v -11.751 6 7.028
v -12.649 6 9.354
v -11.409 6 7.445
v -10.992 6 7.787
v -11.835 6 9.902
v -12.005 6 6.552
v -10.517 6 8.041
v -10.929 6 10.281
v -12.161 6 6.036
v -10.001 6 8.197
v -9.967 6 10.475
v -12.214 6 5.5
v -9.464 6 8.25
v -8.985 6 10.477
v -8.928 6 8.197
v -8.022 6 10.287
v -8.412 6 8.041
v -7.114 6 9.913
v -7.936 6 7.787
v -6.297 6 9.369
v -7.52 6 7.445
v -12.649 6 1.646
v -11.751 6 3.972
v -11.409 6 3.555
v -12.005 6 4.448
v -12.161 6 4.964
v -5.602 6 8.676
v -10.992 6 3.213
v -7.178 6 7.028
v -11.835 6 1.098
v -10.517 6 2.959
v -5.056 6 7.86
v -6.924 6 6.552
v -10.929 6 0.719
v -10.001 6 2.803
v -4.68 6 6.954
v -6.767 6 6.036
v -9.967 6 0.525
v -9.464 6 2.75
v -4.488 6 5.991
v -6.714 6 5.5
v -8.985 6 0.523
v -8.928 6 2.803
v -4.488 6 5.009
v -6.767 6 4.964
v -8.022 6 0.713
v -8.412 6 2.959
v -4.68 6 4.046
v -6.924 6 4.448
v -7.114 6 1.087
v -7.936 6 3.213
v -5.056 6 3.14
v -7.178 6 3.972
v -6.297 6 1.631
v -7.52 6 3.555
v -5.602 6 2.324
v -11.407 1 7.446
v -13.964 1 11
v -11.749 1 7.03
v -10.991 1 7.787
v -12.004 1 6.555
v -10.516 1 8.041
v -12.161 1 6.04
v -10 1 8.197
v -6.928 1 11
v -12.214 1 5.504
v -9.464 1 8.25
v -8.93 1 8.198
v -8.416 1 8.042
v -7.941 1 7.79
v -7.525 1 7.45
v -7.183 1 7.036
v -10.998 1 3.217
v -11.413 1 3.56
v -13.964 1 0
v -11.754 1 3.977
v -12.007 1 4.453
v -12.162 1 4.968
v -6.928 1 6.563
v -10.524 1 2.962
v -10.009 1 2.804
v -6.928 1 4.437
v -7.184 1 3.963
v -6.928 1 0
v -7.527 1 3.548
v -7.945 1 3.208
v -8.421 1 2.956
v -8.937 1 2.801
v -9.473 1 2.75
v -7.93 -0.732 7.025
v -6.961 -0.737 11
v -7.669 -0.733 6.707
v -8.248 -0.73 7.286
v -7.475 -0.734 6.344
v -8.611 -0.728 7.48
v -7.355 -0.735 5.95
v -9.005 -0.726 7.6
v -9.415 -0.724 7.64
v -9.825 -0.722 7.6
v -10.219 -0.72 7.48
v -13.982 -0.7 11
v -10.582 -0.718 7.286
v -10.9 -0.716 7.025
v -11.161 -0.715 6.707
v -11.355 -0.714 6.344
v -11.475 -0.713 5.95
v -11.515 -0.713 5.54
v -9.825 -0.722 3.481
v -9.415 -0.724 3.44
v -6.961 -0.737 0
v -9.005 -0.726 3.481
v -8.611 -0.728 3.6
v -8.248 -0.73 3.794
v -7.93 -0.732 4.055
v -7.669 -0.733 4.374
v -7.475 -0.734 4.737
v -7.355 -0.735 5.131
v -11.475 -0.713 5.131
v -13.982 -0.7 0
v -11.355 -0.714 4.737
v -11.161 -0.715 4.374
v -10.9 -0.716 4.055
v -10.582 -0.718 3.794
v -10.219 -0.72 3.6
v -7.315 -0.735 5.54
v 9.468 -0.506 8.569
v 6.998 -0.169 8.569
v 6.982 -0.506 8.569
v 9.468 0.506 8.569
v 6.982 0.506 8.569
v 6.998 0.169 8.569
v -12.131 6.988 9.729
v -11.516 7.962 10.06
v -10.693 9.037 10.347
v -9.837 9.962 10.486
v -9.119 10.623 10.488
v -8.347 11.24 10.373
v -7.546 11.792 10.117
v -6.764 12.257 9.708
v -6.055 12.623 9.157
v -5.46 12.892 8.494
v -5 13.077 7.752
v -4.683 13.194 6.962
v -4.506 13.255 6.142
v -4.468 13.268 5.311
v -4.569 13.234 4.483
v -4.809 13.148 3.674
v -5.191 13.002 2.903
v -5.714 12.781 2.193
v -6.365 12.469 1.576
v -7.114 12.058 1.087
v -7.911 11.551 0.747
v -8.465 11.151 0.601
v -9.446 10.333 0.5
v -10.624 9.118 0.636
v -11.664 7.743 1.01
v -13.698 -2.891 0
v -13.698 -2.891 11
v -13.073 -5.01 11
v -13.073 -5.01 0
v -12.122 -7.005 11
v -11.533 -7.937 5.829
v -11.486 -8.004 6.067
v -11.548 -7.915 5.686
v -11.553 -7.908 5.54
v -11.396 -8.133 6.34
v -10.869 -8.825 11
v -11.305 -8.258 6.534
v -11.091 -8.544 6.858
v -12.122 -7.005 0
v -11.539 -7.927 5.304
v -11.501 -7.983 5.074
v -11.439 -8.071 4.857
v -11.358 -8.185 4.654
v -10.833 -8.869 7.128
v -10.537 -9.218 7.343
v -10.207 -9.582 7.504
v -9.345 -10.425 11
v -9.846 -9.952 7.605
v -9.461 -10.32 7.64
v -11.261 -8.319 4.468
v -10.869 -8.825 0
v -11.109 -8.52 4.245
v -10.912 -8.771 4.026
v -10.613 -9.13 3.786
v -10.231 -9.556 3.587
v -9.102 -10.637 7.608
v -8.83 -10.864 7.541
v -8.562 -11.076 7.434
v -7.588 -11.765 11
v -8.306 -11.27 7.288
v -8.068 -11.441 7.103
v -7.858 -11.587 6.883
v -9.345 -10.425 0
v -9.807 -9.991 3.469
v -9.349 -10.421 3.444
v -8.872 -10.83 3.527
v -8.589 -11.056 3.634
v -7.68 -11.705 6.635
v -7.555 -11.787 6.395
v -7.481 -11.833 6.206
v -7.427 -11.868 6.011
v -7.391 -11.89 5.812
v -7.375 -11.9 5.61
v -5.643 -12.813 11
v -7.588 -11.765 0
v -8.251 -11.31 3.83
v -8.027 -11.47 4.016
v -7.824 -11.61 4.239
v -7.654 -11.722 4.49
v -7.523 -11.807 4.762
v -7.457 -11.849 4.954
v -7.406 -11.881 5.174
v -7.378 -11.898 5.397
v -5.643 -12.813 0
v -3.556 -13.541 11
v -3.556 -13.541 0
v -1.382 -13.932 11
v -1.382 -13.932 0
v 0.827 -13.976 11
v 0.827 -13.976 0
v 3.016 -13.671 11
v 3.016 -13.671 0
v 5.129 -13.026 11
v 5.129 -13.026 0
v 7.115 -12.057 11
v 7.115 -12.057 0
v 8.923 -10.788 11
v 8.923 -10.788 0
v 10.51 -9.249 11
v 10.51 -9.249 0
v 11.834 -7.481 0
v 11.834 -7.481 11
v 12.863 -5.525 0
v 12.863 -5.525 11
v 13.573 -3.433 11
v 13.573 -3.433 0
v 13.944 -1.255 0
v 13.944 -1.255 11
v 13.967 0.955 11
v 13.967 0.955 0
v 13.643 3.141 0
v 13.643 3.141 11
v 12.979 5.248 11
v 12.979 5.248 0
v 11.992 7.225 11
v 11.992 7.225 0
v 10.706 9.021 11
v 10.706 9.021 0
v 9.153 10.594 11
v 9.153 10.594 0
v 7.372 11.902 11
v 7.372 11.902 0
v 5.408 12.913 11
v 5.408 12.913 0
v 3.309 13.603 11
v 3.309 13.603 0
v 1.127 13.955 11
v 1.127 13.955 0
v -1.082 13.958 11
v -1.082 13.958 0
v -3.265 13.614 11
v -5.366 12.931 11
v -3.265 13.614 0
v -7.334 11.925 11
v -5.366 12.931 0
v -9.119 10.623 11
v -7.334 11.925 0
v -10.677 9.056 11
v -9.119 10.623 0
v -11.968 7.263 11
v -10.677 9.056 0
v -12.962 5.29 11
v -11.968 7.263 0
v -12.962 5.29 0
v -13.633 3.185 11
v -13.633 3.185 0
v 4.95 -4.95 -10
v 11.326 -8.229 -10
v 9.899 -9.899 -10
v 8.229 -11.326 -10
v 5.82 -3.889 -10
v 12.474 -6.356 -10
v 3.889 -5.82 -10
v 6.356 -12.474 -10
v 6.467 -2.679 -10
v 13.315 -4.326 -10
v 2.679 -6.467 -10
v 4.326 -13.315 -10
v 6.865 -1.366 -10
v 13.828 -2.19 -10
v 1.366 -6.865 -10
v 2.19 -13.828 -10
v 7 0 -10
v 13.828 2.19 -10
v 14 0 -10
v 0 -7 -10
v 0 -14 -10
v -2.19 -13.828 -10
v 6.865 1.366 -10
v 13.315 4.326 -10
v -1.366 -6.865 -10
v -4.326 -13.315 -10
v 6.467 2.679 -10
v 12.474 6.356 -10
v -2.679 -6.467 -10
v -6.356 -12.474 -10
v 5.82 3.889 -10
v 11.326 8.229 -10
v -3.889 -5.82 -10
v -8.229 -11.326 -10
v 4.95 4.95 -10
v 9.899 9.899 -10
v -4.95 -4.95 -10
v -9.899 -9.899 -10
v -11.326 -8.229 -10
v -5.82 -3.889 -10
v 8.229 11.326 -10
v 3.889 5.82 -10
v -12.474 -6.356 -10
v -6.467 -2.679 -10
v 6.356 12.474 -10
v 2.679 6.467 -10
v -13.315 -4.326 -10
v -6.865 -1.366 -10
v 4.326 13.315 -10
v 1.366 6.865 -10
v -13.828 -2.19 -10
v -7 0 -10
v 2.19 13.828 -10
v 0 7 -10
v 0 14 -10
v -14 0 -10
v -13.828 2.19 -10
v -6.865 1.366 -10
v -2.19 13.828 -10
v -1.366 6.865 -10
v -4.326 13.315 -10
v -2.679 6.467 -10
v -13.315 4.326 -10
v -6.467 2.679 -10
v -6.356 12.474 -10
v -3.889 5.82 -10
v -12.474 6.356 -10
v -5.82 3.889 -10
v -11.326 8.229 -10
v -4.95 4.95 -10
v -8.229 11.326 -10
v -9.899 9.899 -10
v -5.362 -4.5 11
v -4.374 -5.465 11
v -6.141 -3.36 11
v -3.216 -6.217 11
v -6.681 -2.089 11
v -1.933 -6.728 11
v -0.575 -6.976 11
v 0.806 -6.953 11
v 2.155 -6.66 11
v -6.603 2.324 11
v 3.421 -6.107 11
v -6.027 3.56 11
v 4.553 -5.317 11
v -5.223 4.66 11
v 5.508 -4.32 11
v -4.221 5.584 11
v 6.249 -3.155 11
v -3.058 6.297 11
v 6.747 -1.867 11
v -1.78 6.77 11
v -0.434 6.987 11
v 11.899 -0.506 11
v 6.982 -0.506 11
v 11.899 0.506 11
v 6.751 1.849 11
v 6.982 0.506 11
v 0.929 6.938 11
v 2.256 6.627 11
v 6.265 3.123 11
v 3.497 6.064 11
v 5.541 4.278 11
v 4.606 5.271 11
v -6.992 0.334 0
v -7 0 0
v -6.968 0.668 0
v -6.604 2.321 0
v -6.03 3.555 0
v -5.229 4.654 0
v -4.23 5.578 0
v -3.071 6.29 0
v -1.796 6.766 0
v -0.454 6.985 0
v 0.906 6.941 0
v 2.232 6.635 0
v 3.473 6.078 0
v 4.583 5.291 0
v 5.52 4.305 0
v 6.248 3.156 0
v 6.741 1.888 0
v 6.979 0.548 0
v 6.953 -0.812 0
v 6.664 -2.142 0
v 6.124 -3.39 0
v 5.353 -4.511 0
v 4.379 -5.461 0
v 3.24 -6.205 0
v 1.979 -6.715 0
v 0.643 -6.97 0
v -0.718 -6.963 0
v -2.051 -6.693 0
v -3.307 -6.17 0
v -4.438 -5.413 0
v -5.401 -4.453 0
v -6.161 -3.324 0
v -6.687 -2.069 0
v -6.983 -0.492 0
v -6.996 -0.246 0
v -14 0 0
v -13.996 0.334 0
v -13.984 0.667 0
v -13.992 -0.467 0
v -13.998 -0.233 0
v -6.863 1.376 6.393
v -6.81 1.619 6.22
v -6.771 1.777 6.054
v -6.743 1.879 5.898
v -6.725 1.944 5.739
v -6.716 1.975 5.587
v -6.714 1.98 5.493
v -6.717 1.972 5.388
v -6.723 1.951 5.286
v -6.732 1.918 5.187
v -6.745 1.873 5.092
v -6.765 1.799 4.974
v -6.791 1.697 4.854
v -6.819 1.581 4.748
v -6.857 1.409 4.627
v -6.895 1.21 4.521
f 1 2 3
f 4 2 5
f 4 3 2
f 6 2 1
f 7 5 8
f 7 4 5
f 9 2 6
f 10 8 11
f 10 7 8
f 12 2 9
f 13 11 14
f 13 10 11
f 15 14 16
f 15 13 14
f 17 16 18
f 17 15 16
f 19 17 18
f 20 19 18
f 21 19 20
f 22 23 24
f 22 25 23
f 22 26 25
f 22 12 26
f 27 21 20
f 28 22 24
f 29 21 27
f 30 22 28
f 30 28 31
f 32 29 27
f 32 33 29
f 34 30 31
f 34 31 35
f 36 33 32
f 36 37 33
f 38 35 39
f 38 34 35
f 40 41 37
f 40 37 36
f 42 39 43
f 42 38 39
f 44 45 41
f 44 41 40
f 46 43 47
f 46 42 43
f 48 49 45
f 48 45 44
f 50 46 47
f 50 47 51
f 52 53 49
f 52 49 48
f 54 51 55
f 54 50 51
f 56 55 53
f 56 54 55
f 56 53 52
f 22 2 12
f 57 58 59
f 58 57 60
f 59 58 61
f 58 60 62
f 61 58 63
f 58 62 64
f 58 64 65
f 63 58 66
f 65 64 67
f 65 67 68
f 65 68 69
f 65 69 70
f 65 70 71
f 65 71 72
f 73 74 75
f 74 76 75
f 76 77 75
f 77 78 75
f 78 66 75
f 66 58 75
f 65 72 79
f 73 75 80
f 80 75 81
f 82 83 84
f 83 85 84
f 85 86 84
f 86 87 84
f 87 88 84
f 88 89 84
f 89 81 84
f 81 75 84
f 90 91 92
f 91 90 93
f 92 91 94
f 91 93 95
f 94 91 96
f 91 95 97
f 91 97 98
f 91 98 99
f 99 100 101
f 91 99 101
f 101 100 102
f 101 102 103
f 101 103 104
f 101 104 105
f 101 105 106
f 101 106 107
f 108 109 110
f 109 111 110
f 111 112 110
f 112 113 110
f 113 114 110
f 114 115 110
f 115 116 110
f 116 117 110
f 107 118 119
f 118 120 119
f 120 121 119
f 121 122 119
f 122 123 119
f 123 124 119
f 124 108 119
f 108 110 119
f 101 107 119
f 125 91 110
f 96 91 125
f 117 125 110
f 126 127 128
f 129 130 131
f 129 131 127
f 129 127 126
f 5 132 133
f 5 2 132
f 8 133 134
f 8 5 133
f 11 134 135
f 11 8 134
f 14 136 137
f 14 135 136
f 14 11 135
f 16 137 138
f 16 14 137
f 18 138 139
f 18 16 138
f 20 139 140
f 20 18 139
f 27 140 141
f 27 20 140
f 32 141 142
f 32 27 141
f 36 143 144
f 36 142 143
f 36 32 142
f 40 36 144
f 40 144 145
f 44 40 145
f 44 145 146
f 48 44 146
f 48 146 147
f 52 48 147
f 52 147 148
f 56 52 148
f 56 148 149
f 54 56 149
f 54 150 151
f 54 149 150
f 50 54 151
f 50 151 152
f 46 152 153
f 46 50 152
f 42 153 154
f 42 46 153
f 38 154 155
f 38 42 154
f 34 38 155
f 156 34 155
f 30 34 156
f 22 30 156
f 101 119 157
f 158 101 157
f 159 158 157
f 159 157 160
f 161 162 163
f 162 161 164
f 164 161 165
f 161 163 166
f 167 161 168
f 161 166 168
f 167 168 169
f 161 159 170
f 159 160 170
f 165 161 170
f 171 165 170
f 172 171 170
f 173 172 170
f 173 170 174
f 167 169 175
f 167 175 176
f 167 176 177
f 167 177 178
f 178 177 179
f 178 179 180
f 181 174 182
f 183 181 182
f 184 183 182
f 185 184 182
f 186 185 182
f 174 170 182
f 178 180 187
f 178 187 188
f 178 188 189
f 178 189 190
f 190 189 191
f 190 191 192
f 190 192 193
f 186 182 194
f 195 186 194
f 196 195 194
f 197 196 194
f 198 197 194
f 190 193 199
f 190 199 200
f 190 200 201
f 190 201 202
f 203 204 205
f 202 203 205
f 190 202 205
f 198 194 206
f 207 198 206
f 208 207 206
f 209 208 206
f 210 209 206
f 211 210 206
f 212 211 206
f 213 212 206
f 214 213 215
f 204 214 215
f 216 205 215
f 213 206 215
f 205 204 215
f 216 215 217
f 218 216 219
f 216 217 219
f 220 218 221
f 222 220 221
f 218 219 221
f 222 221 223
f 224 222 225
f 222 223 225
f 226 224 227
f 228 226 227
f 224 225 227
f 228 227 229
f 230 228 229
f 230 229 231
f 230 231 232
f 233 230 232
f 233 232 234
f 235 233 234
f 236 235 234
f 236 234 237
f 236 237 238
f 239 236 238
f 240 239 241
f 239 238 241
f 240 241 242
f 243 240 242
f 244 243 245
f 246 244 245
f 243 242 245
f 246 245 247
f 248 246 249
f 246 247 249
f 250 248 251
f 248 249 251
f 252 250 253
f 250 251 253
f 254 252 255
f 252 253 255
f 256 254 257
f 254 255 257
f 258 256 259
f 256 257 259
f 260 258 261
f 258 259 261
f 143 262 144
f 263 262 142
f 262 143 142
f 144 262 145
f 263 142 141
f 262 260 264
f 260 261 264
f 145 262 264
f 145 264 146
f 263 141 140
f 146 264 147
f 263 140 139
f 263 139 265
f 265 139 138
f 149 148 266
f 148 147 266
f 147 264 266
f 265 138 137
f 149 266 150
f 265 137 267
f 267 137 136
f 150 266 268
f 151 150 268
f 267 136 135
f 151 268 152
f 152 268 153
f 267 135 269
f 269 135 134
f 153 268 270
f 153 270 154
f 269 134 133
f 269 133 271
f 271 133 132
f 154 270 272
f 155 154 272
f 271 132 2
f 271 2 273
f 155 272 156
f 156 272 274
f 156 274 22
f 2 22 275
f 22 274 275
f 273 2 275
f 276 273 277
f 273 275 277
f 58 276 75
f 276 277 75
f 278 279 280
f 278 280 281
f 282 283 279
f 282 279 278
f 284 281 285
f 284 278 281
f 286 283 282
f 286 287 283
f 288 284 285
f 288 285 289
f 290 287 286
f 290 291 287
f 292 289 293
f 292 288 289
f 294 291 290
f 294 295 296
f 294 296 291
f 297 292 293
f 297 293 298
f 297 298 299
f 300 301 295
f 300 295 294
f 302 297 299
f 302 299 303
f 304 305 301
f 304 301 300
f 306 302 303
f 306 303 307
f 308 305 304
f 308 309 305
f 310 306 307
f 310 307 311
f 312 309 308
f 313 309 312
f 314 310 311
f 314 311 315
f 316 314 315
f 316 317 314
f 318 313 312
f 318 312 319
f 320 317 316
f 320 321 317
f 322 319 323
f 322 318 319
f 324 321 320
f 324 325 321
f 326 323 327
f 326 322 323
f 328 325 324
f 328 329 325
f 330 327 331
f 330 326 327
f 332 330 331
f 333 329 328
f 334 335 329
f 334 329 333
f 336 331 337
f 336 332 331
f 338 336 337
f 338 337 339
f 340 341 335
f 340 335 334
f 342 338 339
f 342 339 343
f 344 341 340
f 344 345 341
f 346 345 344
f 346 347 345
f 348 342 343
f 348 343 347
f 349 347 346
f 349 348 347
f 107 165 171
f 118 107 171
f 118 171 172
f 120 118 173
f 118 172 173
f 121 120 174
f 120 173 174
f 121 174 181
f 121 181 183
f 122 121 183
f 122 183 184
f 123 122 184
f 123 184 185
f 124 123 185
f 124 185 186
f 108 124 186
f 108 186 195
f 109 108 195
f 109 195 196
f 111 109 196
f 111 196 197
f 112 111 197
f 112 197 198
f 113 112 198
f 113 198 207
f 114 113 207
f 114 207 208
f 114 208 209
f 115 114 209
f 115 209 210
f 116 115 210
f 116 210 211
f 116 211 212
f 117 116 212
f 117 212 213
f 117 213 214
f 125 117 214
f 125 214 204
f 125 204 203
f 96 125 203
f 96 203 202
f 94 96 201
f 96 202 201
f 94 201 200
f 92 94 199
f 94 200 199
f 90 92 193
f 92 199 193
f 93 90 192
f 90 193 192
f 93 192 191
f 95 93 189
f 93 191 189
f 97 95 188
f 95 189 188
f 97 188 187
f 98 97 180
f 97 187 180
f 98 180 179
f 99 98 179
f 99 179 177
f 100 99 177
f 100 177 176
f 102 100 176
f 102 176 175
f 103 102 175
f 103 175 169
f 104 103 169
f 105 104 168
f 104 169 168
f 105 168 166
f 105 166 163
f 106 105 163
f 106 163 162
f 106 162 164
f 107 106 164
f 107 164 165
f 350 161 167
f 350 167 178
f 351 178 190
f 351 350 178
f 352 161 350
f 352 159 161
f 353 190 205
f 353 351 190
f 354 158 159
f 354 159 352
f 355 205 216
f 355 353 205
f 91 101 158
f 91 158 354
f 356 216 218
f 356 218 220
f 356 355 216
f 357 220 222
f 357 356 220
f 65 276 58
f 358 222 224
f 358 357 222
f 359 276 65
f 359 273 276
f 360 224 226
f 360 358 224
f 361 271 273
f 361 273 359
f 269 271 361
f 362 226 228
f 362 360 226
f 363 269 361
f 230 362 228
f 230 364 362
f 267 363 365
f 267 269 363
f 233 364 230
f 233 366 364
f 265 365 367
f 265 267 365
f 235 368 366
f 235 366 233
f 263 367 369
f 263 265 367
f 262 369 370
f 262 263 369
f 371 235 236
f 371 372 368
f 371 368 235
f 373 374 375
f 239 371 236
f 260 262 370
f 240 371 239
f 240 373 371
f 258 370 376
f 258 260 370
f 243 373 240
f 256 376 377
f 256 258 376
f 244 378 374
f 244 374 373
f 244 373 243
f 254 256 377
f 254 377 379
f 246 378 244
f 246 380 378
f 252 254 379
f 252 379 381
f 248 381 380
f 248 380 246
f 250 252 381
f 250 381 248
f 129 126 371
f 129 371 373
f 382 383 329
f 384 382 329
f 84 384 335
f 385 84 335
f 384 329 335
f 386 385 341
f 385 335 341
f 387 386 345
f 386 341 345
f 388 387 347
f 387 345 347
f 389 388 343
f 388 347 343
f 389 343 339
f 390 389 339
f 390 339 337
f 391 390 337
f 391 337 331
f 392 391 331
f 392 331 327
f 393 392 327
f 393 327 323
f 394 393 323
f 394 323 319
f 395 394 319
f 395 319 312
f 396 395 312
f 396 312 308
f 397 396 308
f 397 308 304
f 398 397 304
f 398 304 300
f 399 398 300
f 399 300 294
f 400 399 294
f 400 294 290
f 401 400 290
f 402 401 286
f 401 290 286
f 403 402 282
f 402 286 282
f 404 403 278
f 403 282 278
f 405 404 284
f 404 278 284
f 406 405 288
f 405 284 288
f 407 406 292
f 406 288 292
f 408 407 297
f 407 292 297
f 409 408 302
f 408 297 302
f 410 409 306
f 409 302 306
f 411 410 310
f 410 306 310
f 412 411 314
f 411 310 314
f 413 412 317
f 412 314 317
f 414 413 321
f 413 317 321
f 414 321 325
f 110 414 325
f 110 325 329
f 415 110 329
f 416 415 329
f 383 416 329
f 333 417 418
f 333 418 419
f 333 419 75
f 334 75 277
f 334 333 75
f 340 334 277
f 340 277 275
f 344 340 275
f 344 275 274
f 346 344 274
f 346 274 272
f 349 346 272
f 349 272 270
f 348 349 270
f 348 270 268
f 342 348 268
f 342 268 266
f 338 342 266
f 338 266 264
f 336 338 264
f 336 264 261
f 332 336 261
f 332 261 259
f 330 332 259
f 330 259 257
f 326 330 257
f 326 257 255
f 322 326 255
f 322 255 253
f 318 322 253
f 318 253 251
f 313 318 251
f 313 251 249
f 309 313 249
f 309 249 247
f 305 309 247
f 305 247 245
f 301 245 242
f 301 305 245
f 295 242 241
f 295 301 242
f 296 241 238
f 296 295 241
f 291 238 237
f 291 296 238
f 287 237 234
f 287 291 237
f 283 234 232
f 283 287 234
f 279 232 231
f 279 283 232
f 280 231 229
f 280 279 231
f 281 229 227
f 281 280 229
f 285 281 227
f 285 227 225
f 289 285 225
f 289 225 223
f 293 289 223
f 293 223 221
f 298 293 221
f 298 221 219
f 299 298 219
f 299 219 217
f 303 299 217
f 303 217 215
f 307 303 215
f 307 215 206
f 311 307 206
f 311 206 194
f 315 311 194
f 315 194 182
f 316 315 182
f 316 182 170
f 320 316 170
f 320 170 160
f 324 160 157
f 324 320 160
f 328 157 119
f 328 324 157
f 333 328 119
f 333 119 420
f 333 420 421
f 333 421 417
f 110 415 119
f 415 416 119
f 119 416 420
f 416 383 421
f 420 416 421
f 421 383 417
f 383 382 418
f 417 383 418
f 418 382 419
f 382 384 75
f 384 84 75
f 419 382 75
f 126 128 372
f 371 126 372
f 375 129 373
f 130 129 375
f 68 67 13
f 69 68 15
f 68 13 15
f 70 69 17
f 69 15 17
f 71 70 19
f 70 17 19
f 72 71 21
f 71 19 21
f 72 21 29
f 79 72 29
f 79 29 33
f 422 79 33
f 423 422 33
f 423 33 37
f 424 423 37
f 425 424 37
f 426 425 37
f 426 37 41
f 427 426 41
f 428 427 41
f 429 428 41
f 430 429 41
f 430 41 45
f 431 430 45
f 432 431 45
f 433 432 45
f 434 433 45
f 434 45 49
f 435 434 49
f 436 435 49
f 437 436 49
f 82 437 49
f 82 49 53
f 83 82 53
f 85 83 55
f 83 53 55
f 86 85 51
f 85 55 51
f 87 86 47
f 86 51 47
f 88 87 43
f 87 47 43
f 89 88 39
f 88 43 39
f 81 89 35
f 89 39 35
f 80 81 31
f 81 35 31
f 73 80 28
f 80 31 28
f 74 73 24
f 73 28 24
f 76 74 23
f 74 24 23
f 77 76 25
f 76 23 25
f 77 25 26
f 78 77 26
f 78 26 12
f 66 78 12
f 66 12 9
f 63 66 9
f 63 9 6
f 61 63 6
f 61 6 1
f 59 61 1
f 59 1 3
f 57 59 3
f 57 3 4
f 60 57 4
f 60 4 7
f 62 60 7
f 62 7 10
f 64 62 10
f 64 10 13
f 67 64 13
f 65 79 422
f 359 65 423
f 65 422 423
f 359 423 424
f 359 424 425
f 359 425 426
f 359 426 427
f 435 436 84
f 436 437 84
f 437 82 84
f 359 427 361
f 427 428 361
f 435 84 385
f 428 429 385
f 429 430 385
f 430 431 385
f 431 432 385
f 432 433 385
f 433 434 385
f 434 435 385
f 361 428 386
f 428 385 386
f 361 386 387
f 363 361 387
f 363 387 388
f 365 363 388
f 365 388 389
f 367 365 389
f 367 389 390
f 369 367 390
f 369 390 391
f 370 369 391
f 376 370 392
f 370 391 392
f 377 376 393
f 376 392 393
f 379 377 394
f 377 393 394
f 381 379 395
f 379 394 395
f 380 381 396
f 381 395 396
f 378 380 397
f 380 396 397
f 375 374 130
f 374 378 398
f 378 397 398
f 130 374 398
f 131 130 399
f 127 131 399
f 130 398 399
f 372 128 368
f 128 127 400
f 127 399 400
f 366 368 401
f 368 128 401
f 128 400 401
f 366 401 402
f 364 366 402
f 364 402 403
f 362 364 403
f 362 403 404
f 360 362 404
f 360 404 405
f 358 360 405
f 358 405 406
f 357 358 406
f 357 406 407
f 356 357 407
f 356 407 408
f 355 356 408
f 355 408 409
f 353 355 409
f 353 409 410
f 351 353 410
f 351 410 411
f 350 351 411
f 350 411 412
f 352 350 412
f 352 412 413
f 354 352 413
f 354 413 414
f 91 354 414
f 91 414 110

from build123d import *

# Parameters (mm, degrees)
EXTRUDE_1_DEPTH        = 11
SKETCH_6_R             = 5
CUT_EXTRUDE_2_DEPTH    = 15
SKETCH_7_R             = 2.75
CUT_EXTRUDE_3_DEPTH    = 6
EXTRUDE_START          = 10
SKETCH_18_R            = 14
SKETCH_18_R_2          = 7
EXTRUDE_2_DEPTH        = 10
HOLE_WIZARD_M5_2_D     = 4.2
HOLE_WIZARD_M5_2_DEPTH = 19
HOLE_WIZARD_M5_2_TIP   = 1.2618073


with BuildPart() as part:
    # 草图1 → 凸台-拉伸1 (new body)
    with BuildSketch(Plane.XY):
        with BuildLine():
            Line((-13.964240044, 1), (-6.92820323, 1))
            ThreePointArc((-6.92820323, 1), (6.998743905, -0.13260372), (-6.96111081, -0.736842105))
            Line((-6.96111081, -0.736842105), (-13.982489049, -0.7))
            ThreePointArc((-13.982489049, -0.7), (13.999193432, -0.150277266), (-13.964240044, 1))
        make_face()
    extrude(amount=EXTRUDE_1_DEPTH)

    # 切除-扫描1: sweep along a path in 草图3
    with BuildLine(Plane(origin=(0, 0, 0), x_dir=(1, 0, 0), z_dir=(0, 1, 0))) as sweep_1_path:
        Line((11.898777818, -11), (9.4677896, -8.569011782))
    # 草图2 → 切除-扫描1 (sweep, cut)
    with BuildSketch(Plane.XY.offset(11)):
        with BuildLine():
            Line((6.981701169, 0.505814966), (11.898777818, 0.505814966))
            Line((11.898777818, 0.505814966), (11.898777818, -0.505814966))
            Line((11.898777818, -0.505814966), (6.981701169, -0.505814966))
            ThreePointArc((6.981701169, -0.505814966), (7, 0), (6.981701169, 0.505814966))
        make_face()
    sweep(path=sweep_1_path.line, mode=Mode.SUBTRACT)

    # 草图6 → 切除-拉伸2 (cut)
    with BuildSketch(Plane(origin=(0, 6, 0), x_dir=(1, 0, 0), z_dir=(0, 1, 0))):
        with Locations((-9.464240044, -5.5)):
            Circle(SKETCH_6_R)
    extrude(amount=CUT_EXTRUDE_2_DEPTH, mode=Mode.SUBTRACT)

    # 草图7 → 切除-拉伸3 (cut)
    with BuildSketch(Plane(origin=(0, 6, 0), x_dir=(1, 0, 0), z_dir=(0, 1, 0))):
        with Locations(Location((-9.464240044, -5.5, 0), (0, 0, 270))):
            Circle(SKETCH_7_R)
    extrude(amount=-CUT_EXTRUDE_3_DEPTH, mode=Mode.SUBTRACT)

    # 草图18 → 凸台-拉伸2 (add)
    with BuildSketch(Plane(origin=(0, 0, 0), x_dir=(-1, 0, 0), z_dir=(0, 0, -1)).offset(EXTRUDE_START)):
        Circle(SKETCH_18_R)
        Circle(SKETCH_18_R_2, mode=Mode.SUBTRACT)
    extrude(amount=-EXTRUDE_2_DEPTH)

    # M5 螺纹孔2
    with Locations(Plane(origin=(-0.004057853, -0.773346687, 0), x_dir=(0.9999862340820442, -0.005247060740183186, 0), z_dir=(0.005247060740183185, 0.9999862340820441, 0))):
        with Locations((-9.411026536, -5.540271142)):
            Hole(HOLE_WIZARD_M5_2_D / 2, depth=HOLE_WIZARD_M5_2_DEPTH)
            with Locations((0, 0, -(HOLE_WIZARD_M5_2_DEPTH + HOLE_WIZARD_M5_2_TIP / 2))):  # 118° drill point
                Cone(0, HOLE_WIZARD_M5_2_D / 2, HOLE_WIZARD_M5_2_TIP, mode=Mode.SUBTRACT)


solid = part.part
